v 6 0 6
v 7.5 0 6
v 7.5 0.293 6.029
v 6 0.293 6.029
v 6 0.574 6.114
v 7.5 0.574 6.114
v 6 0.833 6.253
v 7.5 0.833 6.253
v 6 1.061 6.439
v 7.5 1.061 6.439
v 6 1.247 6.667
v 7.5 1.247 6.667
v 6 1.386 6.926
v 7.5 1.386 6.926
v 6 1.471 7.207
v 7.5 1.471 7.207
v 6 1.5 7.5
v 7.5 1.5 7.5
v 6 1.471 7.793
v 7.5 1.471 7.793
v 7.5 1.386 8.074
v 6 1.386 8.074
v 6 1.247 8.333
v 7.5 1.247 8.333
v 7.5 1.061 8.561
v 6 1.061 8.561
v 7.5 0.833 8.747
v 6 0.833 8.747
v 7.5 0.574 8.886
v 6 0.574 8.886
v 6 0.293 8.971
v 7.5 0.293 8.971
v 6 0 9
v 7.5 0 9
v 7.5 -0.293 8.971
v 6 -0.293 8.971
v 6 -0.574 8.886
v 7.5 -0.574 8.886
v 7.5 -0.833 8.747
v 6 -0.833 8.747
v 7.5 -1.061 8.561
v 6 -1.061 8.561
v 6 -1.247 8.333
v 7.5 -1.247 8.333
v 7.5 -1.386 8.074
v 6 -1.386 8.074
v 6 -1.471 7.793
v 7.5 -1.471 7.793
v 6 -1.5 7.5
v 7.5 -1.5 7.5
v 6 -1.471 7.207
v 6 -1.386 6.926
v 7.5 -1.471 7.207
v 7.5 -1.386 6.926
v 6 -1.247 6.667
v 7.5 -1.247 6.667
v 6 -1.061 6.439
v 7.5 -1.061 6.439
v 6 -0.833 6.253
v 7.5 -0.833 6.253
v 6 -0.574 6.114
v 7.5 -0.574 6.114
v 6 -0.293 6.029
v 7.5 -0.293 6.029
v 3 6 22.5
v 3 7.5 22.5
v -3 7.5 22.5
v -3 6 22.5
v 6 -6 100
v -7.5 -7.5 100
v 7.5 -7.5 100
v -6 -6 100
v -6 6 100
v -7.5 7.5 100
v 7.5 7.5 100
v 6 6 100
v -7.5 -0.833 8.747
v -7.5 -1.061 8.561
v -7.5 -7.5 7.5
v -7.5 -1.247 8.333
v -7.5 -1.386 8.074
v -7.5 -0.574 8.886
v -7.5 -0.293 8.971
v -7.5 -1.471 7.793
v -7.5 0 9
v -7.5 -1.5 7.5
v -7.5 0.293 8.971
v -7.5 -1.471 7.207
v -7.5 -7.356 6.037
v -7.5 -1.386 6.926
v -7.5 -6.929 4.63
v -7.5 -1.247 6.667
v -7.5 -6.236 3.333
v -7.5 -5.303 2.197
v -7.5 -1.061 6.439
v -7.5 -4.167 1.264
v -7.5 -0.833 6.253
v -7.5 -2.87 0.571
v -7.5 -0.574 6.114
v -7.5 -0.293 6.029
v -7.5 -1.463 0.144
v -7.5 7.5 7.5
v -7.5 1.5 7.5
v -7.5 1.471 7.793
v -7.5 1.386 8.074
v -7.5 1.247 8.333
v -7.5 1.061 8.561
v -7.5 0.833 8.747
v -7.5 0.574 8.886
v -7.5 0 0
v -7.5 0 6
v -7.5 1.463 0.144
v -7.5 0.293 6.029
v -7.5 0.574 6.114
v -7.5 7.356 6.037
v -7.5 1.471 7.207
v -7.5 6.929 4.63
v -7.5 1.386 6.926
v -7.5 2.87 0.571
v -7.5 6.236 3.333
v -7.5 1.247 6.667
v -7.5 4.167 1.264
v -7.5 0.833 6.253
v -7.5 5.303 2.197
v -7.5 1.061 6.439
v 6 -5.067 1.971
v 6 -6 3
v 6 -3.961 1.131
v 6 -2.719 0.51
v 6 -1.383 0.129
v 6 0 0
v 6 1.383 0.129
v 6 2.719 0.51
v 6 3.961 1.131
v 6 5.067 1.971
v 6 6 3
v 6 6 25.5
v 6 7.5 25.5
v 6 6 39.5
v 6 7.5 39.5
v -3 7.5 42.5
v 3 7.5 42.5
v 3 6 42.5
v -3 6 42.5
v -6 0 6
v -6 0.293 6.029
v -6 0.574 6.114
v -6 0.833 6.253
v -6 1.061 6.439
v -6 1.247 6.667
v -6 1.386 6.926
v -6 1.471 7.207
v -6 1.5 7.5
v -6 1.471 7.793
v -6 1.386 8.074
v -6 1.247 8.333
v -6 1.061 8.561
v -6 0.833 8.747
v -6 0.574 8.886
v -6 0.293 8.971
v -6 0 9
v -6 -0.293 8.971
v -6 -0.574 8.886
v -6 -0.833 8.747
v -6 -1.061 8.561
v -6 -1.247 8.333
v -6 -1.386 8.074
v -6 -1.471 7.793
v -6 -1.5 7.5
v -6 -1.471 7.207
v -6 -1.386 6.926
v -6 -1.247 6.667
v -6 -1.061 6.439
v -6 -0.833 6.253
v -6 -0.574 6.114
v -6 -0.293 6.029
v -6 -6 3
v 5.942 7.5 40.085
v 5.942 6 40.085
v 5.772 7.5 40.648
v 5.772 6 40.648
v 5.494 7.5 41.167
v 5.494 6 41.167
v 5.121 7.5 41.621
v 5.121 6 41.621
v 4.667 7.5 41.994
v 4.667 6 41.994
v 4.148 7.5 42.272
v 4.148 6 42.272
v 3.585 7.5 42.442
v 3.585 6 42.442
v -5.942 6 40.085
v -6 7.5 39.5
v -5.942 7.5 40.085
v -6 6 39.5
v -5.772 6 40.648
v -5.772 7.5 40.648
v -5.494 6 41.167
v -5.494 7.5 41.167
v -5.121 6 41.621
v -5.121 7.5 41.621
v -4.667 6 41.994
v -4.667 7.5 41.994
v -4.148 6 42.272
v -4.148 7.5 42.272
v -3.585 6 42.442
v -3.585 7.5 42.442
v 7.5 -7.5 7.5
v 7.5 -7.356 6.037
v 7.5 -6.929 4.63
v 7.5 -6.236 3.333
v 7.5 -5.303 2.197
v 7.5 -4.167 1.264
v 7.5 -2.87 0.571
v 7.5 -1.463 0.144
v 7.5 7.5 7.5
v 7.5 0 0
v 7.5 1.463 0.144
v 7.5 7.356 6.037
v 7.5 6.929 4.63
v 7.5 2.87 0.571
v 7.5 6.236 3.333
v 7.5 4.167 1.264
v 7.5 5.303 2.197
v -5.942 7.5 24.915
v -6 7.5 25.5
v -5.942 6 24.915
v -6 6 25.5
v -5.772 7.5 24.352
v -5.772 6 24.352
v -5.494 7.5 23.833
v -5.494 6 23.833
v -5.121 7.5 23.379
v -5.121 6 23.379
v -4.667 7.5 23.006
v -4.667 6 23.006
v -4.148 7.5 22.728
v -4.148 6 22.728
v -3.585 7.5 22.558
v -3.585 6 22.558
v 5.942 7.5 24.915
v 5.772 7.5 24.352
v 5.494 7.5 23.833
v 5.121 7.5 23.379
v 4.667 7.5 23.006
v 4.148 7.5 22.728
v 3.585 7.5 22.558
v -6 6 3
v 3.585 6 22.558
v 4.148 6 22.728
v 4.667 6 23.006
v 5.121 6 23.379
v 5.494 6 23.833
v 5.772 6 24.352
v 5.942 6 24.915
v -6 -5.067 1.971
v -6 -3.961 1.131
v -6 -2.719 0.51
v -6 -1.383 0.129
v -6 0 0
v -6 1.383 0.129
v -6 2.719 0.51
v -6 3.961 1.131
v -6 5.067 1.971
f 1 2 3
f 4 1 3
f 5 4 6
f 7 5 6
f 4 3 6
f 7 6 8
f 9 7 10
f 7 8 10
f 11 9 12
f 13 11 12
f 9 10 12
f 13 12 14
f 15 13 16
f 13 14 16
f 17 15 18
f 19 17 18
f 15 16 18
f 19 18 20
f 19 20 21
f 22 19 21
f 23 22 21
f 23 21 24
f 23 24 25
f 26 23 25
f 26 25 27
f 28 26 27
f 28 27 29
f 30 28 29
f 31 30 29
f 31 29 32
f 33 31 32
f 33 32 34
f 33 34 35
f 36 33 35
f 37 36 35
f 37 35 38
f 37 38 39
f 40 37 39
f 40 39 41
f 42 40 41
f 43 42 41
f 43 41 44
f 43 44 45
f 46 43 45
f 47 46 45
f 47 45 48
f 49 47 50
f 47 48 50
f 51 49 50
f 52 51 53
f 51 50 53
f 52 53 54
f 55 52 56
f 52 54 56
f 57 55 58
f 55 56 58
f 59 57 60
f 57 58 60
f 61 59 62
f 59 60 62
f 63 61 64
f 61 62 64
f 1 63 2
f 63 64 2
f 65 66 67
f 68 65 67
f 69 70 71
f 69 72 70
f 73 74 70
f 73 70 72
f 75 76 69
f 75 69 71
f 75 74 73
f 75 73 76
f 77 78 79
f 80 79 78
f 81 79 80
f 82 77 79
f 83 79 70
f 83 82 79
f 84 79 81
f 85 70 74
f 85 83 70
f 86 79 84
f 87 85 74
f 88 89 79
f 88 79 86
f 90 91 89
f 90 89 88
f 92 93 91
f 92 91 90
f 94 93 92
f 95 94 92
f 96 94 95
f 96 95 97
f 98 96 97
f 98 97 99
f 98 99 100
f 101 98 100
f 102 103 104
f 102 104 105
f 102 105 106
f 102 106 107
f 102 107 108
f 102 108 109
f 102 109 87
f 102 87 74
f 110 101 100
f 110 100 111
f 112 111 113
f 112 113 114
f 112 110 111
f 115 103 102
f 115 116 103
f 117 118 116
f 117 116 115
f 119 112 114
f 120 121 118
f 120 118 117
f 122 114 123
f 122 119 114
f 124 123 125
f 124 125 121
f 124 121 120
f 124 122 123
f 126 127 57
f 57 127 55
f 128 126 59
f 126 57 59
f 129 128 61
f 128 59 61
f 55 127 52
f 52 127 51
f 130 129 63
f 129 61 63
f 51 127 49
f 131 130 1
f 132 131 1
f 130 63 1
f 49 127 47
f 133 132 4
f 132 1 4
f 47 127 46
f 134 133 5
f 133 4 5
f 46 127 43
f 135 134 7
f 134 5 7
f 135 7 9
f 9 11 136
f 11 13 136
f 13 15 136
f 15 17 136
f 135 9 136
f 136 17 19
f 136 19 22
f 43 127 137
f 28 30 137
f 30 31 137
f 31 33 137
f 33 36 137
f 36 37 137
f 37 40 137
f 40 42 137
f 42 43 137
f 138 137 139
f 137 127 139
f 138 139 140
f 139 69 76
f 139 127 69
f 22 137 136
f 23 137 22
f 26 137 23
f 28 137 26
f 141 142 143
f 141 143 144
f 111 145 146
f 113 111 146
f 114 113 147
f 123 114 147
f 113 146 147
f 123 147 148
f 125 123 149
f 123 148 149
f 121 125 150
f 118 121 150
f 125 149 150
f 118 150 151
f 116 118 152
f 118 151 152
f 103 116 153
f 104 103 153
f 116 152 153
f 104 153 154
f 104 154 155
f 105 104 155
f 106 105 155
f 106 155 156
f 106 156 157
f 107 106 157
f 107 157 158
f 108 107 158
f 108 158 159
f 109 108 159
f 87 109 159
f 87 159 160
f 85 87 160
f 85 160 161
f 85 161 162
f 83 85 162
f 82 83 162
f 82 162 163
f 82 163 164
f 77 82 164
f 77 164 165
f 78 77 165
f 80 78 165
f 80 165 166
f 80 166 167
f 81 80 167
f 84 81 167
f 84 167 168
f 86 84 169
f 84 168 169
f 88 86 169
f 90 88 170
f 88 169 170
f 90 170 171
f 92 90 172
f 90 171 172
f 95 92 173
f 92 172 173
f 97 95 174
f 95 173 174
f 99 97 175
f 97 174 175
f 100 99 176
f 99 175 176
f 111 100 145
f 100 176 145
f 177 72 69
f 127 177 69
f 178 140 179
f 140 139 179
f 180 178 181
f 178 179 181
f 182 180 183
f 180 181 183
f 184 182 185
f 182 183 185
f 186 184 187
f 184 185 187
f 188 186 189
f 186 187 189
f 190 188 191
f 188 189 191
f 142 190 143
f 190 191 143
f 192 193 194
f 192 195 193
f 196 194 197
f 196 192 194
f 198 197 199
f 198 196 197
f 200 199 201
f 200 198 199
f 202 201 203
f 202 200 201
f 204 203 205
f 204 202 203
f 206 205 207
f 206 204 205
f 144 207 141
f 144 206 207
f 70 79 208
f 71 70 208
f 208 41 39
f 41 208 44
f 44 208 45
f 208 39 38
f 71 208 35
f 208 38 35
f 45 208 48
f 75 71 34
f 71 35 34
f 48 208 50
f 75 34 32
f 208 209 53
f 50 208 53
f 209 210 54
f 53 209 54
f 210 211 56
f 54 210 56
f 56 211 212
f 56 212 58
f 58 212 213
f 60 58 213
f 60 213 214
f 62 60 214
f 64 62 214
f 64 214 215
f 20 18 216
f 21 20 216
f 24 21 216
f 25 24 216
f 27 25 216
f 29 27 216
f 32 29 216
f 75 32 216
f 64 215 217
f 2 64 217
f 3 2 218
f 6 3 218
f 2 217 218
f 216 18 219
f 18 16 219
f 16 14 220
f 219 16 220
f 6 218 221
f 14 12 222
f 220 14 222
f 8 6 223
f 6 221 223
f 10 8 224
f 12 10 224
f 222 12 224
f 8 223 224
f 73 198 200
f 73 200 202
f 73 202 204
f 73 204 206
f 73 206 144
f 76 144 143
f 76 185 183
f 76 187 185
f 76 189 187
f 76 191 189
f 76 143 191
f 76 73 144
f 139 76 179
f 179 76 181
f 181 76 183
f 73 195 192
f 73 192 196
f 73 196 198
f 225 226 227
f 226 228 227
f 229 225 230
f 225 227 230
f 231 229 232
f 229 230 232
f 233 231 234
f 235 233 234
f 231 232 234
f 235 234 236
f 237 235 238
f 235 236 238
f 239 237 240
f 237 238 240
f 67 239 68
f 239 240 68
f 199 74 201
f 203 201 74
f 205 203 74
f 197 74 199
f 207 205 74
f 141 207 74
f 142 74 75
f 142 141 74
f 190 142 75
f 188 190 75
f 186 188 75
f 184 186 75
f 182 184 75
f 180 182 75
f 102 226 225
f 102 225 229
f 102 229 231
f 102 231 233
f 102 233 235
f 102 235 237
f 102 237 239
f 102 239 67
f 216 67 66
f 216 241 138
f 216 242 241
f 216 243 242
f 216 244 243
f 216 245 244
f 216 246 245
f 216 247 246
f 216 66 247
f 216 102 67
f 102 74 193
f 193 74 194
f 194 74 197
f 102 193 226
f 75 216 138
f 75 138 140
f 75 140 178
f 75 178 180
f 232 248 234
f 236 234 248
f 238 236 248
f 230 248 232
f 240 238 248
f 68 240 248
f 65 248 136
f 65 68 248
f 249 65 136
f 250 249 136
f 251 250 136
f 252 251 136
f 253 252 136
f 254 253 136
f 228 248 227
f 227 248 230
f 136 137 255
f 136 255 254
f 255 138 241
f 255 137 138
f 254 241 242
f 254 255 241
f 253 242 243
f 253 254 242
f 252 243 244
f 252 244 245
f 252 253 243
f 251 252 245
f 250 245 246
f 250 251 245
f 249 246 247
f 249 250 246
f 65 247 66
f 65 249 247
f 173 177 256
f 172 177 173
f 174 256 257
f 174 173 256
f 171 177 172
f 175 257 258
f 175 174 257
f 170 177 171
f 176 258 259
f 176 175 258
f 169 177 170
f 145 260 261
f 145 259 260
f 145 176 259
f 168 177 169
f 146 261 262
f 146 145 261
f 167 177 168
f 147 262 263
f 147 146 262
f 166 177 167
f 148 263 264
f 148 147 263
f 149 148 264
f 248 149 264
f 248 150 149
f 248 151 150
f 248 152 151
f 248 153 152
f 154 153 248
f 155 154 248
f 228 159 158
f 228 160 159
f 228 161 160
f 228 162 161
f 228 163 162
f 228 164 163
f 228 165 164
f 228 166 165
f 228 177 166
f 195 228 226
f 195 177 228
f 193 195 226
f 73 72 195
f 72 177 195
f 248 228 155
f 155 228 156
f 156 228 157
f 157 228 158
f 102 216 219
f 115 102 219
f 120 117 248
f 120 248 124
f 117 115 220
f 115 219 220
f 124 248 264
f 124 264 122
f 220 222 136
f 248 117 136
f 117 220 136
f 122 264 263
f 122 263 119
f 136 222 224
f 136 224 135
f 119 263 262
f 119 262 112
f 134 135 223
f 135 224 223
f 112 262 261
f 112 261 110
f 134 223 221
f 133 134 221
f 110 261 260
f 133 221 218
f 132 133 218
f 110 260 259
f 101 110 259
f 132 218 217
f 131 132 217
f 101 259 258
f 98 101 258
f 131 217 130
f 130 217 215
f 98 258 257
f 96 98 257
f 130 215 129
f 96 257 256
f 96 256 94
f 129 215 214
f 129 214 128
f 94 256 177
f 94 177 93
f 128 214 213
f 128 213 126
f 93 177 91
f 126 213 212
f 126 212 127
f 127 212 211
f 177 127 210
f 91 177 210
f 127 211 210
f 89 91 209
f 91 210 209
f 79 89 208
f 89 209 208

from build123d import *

# Parameters (mm, degrees)
ESQUISSE1_W             = 15
ESQUISSE1_H             = 15
EXTRUSION1_DEPTH        = 100
ESQUISSE2_W             = 12
ESQUISSE2_H             = 12
EXTRUSION2_DEPTH        = 101.560926806
CONG_1_R                = 7.5
ESQUISSE3_R             = 1.5
EXTRUSION3_DEPTH        = 102.396498953
ESQUISSE4_W             = 12
ESQUISSE4_H             = 20
ENL_V_MAT_EXTRU_1_DEPTH = 3
CONG_2_R                = 3


with BuildPart() as part:
    # Esquisse1 → Extrusion1 (new body)
    with BuildSketch(Plane.XY):
        Rectangle(ESQUISSE1_W, ESQUISSE1_H)
    extrude(amount=EXTRUSION1_DEPTH)

    # Esquisse2 → Extrusion2 (cut, through all)
    with BuildSketch(Plane.XY.offset(100)):
        Rectangle(ESQUISSE2_W, ESQUISSE2_H)
    extrude(amount=-EXTRUSION2_DEPTH, mode=Mode.SUBTRACT)

    # Congé1
    # the kernel refuses this fillet: 7.5 mm, written as the material it takes off along each edge
    with BuildSketch(Plane(origin=(-26.25, -7.5, 0), x_dir=(0, 0, 1), z_dir=(1, 0, 0))) as cong_1_piece_1:
        with BuildLine():
            CenterArc((CONG_1_R, -CONG_1_R), CONG_1_R, 90, 90)
            Line((0, -CONG_1_R), (0, 0))
            Line((0, 0), (CONG_1_R, 0))
        make_face()
    extrude(amount=52.5, mode=Mode.SUBTRACT)
    with BuildSketch(Plane(origin=(26.25, 7.5, 0), x_dir=(0, -1, 0), z_dir=(-1, 0, 0))) as cong_1_piece_2:
        with BuildLine():
            CenterArc((CONG_1_R, CONG_1_R), CONG_1_R, 180, 90)
            Line((0, CONG_1_R), (0, 0))
            Line((0, 0), (CONG_1_R, 0))
        make_face()
    extrude(amount=52.5, mode=Mode.SUBTRACT)

    # Esquisse3 → Extrusion3 (cut, through all)
    with BuildSketch(Plane(origin=(7.5, 0, 0), x_dir=(0, 0, -1), z_dir=(1, 0, 0))):
        with Locations((-7.5, 0)):
            Circle(ESQUISSE3_R)
    extrude(amount=-EXTRUSION3_DEPTH, mode=Mode.SUBTRACT)

    # Esquisse4 → Enlèv. mat.-Extru.1 (cut)
    with BuildSketch(Plane(origin=(0, 7.5, 0), x_dir=(-1, 0, 0), z_dir=(0, 1, 0))):
        with Locations((0, 32.5)):
            Rectangle(ESQUISSE4_W, ESQUISSE4_H)
    extrude(amount=-ENL_V_MAT_EXTRU_1_DEPTH, mode=Mode.SUBTRACT)

    # Congé2
    cong_2_edges = [part.edges().sort_by_distance(p)[0] for p in [
        (-6, 6.75, 42.5),
        (-6, 6.75, 22.5),
        (6, 6.75, 22.5),
        (6, 6.75, 42.5),
    ]]
    fillet(cong_2_edges, radius=CONG_2_R)


solid = part.part
